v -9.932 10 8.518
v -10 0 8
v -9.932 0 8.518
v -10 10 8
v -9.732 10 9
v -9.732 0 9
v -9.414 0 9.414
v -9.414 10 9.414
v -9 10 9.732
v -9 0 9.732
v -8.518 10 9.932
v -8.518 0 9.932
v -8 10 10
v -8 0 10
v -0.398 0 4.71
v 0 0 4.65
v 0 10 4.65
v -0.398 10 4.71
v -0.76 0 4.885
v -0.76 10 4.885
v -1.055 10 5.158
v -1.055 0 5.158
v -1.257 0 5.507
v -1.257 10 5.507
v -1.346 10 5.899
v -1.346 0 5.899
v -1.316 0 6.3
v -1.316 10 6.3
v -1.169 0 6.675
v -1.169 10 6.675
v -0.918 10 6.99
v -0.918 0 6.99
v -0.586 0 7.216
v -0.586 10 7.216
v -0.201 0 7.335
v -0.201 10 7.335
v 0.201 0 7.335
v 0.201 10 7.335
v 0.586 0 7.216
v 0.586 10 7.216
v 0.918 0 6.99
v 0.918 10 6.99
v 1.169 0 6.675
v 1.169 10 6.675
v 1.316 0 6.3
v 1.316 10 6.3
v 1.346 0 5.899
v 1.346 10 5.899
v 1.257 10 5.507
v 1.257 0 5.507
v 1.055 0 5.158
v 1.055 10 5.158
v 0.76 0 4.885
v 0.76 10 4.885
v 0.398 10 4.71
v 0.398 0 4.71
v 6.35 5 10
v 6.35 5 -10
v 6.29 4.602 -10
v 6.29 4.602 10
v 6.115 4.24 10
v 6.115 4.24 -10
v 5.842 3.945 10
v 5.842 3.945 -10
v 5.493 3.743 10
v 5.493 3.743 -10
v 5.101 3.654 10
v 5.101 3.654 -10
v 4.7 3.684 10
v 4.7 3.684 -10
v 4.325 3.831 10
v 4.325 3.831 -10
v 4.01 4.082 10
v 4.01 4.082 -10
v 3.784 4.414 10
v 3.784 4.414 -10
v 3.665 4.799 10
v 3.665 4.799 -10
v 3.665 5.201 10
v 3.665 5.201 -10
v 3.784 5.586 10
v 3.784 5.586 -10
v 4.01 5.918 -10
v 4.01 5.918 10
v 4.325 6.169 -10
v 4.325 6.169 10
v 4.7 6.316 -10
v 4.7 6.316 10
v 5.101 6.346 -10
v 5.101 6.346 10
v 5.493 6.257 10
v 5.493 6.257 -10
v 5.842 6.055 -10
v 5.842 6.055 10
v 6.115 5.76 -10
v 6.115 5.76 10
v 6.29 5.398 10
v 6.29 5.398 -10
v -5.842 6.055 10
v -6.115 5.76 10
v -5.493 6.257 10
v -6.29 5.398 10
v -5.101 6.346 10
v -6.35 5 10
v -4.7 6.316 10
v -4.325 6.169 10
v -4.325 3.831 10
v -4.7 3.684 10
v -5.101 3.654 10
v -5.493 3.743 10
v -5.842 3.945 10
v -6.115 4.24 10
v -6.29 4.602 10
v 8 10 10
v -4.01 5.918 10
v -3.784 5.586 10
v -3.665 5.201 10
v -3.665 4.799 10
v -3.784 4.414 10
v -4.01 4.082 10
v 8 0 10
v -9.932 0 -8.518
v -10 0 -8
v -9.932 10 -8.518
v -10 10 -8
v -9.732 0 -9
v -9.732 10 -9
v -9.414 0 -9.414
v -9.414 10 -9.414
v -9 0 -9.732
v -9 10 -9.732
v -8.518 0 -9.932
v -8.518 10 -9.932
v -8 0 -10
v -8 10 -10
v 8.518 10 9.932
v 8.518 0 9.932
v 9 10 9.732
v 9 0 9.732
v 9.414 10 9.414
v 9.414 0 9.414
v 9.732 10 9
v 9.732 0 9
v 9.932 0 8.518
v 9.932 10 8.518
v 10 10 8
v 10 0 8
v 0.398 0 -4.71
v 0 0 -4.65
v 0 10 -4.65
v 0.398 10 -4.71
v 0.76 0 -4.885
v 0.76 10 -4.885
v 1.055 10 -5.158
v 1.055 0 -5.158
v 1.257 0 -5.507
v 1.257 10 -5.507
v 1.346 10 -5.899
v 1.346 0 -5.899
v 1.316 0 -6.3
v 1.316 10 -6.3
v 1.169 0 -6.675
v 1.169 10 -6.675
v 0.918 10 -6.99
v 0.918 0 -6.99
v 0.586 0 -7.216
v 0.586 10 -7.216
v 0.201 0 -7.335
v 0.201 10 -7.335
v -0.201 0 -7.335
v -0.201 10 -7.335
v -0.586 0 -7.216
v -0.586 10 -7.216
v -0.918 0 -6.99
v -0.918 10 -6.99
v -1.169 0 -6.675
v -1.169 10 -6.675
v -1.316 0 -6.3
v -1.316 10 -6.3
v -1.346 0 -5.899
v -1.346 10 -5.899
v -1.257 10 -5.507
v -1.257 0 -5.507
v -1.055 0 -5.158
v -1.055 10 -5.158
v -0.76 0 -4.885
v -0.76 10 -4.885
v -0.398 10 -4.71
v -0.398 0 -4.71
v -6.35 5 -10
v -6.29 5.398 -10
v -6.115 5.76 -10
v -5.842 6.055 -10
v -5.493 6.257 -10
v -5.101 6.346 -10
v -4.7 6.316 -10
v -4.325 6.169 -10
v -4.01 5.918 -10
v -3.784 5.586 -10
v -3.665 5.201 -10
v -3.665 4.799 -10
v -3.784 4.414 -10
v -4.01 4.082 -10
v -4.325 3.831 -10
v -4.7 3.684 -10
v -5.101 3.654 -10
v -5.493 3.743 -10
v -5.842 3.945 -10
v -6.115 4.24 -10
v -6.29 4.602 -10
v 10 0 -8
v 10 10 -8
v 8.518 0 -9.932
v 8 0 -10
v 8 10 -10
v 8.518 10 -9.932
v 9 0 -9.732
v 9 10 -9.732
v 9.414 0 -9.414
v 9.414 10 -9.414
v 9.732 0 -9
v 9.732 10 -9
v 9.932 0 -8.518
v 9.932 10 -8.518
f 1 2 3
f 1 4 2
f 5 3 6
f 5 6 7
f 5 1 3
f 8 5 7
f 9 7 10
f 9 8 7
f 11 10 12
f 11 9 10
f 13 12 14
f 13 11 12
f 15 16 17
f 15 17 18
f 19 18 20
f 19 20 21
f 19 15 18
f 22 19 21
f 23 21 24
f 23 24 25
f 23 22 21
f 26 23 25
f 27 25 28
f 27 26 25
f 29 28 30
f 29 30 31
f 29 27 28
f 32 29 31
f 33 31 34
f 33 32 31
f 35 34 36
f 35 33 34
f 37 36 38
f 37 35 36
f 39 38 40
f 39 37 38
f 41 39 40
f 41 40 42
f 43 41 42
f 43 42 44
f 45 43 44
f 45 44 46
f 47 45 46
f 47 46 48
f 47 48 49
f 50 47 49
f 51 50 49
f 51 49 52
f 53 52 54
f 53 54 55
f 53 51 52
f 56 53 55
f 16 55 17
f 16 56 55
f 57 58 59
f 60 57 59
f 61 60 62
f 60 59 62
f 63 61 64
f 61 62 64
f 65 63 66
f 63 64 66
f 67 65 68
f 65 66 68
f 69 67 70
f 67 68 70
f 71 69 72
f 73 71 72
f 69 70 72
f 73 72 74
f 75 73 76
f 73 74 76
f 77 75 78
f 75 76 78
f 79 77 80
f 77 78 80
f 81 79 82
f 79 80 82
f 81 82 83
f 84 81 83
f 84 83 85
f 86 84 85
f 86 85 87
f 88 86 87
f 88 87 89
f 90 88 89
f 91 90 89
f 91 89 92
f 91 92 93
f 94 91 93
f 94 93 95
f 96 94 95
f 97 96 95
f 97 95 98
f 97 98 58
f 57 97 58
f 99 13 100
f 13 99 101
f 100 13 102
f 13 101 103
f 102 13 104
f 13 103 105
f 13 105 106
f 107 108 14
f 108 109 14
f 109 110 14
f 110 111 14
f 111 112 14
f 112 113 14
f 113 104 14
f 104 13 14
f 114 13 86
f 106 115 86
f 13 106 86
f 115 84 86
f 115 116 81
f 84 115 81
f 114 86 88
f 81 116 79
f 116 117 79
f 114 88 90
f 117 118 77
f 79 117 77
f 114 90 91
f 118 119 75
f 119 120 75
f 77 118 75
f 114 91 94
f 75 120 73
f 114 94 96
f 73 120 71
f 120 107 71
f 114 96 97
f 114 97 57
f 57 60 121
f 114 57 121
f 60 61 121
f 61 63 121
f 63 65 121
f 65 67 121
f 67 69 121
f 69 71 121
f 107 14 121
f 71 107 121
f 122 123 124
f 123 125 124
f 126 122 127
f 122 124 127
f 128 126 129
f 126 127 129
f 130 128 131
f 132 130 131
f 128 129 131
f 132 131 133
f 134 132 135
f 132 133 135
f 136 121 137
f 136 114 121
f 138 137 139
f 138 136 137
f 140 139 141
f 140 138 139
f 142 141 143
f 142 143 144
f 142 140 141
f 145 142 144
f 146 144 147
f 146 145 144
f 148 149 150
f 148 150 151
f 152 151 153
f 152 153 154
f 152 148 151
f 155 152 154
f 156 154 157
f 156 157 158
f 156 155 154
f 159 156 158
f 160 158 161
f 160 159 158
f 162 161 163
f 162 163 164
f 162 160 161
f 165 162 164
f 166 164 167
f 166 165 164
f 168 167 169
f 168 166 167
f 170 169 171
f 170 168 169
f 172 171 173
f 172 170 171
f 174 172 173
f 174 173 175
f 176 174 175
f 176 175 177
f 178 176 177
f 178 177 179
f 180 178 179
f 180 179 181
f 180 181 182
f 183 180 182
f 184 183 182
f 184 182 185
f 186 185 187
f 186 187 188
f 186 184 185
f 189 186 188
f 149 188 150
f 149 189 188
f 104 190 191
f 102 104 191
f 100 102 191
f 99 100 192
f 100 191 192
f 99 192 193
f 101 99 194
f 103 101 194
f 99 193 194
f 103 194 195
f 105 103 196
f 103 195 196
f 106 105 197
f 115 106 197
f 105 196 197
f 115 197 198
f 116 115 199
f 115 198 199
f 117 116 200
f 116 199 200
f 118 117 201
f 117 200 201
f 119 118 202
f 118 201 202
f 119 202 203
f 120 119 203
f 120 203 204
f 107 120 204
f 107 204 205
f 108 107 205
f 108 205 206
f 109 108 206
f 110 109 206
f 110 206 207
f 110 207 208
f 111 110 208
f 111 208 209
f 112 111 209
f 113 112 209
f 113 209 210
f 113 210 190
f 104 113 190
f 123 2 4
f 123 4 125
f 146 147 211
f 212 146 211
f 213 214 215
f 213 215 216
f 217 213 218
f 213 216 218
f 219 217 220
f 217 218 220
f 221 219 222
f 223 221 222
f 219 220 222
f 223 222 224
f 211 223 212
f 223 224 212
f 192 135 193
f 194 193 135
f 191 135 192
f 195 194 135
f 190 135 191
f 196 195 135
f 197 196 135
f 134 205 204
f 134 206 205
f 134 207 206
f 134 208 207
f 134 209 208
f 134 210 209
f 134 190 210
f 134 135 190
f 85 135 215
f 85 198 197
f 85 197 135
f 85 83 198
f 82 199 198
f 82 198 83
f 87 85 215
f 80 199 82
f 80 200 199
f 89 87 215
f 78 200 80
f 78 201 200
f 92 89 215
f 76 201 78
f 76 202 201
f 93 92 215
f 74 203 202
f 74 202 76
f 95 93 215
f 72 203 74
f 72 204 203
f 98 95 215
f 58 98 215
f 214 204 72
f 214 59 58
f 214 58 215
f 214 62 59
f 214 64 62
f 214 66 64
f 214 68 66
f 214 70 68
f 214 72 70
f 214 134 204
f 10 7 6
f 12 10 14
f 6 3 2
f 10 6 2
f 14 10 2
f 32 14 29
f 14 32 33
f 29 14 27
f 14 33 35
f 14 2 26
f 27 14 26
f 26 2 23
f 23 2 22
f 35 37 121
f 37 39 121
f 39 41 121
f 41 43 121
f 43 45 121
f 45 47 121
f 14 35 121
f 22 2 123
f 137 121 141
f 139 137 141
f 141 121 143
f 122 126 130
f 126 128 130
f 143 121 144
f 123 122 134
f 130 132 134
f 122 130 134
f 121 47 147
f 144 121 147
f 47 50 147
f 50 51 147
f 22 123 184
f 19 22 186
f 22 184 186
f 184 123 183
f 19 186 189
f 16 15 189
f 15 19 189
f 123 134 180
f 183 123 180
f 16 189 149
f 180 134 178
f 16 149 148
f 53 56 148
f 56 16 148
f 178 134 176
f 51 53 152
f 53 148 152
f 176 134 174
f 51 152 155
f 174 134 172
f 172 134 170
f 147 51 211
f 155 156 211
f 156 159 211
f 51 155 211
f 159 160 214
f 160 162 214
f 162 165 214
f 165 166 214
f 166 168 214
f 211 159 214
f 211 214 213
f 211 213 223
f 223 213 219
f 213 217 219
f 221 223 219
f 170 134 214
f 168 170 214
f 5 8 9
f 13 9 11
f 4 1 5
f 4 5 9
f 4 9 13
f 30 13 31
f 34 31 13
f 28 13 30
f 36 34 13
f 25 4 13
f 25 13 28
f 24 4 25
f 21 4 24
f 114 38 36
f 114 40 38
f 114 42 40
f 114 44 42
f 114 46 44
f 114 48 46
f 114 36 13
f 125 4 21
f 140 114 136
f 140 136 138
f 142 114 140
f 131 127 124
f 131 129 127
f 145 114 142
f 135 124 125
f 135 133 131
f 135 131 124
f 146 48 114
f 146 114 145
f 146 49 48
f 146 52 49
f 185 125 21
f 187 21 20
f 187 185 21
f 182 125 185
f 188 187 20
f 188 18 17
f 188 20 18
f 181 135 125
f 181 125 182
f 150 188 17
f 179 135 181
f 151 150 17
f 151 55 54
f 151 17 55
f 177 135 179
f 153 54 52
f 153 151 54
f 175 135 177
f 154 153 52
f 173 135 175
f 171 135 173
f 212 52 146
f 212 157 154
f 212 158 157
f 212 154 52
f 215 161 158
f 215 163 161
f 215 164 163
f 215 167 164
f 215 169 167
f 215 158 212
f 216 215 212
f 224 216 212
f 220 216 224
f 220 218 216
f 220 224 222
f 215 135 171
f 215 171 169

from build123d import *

# Parameters (mm, degrees)
SKETCH_1_W          = 20
SKETCH_1_H          = 20
SKETCH_1_R          = 1.35
EXTRUDE_1_DEPTH     = 10
SKETCH_3_R          = 1.35
CUT_EXTRUDE_1_DEPTH = 25.494897428
FILLET_1_R          = 2


with BuildPart() as part:
    # 草图1 → 凸台-拉伸1 (new body)
    with BuildSketch(Plane(origin=(0, 0, 0), x_dir=(1, 0, 0), z_dir=(0, 1, 0))):
        Rectangle(SKETCH_1_W, SKETCH_1_H)
        with Locations(Location((0, 6, 0), (0, 0, 270))):
            Circle(SKETCH_1_R, mode=Mode.SUBTRACT)
        with Locations(Location((0, -6, 0), (0, 0, 90))):
            Circle(SKETCH_1_R, mode=Mode.SUBTRACT)
    extrude(amount=EXTRUDE_1_DEPTH)

    # 草图3 → 切除-拉伸1 (cut, through all)
    with BuildSketch(Plane(origin=(0, 0, -10), x_dir=(-1, 0, 0), z_dir=(0, 0, -1))):
        with Locations((5, 5)):
            Circle(SKETCH_3_R)
        with Locations(Location((-5, 5, 0), (0, 0, 180))):
            Circle(SKETCH_3_R)
    extrude(amount=-CUT_EXTRUDE_1_DEPTH, mode=Mode.SUBTRACT)

    # 圆角1
    fillet_1_edges = [part.edges().sort_by_distance(p)[0] for p in [
        (10, 5, 10),
        (-10, 5, 10),
        (-10, 5, -10),
        (10, 5, -10),
    ]]
    fillet(fillet_1_edges, radius=FILLET_1_R)


solid = part.part
